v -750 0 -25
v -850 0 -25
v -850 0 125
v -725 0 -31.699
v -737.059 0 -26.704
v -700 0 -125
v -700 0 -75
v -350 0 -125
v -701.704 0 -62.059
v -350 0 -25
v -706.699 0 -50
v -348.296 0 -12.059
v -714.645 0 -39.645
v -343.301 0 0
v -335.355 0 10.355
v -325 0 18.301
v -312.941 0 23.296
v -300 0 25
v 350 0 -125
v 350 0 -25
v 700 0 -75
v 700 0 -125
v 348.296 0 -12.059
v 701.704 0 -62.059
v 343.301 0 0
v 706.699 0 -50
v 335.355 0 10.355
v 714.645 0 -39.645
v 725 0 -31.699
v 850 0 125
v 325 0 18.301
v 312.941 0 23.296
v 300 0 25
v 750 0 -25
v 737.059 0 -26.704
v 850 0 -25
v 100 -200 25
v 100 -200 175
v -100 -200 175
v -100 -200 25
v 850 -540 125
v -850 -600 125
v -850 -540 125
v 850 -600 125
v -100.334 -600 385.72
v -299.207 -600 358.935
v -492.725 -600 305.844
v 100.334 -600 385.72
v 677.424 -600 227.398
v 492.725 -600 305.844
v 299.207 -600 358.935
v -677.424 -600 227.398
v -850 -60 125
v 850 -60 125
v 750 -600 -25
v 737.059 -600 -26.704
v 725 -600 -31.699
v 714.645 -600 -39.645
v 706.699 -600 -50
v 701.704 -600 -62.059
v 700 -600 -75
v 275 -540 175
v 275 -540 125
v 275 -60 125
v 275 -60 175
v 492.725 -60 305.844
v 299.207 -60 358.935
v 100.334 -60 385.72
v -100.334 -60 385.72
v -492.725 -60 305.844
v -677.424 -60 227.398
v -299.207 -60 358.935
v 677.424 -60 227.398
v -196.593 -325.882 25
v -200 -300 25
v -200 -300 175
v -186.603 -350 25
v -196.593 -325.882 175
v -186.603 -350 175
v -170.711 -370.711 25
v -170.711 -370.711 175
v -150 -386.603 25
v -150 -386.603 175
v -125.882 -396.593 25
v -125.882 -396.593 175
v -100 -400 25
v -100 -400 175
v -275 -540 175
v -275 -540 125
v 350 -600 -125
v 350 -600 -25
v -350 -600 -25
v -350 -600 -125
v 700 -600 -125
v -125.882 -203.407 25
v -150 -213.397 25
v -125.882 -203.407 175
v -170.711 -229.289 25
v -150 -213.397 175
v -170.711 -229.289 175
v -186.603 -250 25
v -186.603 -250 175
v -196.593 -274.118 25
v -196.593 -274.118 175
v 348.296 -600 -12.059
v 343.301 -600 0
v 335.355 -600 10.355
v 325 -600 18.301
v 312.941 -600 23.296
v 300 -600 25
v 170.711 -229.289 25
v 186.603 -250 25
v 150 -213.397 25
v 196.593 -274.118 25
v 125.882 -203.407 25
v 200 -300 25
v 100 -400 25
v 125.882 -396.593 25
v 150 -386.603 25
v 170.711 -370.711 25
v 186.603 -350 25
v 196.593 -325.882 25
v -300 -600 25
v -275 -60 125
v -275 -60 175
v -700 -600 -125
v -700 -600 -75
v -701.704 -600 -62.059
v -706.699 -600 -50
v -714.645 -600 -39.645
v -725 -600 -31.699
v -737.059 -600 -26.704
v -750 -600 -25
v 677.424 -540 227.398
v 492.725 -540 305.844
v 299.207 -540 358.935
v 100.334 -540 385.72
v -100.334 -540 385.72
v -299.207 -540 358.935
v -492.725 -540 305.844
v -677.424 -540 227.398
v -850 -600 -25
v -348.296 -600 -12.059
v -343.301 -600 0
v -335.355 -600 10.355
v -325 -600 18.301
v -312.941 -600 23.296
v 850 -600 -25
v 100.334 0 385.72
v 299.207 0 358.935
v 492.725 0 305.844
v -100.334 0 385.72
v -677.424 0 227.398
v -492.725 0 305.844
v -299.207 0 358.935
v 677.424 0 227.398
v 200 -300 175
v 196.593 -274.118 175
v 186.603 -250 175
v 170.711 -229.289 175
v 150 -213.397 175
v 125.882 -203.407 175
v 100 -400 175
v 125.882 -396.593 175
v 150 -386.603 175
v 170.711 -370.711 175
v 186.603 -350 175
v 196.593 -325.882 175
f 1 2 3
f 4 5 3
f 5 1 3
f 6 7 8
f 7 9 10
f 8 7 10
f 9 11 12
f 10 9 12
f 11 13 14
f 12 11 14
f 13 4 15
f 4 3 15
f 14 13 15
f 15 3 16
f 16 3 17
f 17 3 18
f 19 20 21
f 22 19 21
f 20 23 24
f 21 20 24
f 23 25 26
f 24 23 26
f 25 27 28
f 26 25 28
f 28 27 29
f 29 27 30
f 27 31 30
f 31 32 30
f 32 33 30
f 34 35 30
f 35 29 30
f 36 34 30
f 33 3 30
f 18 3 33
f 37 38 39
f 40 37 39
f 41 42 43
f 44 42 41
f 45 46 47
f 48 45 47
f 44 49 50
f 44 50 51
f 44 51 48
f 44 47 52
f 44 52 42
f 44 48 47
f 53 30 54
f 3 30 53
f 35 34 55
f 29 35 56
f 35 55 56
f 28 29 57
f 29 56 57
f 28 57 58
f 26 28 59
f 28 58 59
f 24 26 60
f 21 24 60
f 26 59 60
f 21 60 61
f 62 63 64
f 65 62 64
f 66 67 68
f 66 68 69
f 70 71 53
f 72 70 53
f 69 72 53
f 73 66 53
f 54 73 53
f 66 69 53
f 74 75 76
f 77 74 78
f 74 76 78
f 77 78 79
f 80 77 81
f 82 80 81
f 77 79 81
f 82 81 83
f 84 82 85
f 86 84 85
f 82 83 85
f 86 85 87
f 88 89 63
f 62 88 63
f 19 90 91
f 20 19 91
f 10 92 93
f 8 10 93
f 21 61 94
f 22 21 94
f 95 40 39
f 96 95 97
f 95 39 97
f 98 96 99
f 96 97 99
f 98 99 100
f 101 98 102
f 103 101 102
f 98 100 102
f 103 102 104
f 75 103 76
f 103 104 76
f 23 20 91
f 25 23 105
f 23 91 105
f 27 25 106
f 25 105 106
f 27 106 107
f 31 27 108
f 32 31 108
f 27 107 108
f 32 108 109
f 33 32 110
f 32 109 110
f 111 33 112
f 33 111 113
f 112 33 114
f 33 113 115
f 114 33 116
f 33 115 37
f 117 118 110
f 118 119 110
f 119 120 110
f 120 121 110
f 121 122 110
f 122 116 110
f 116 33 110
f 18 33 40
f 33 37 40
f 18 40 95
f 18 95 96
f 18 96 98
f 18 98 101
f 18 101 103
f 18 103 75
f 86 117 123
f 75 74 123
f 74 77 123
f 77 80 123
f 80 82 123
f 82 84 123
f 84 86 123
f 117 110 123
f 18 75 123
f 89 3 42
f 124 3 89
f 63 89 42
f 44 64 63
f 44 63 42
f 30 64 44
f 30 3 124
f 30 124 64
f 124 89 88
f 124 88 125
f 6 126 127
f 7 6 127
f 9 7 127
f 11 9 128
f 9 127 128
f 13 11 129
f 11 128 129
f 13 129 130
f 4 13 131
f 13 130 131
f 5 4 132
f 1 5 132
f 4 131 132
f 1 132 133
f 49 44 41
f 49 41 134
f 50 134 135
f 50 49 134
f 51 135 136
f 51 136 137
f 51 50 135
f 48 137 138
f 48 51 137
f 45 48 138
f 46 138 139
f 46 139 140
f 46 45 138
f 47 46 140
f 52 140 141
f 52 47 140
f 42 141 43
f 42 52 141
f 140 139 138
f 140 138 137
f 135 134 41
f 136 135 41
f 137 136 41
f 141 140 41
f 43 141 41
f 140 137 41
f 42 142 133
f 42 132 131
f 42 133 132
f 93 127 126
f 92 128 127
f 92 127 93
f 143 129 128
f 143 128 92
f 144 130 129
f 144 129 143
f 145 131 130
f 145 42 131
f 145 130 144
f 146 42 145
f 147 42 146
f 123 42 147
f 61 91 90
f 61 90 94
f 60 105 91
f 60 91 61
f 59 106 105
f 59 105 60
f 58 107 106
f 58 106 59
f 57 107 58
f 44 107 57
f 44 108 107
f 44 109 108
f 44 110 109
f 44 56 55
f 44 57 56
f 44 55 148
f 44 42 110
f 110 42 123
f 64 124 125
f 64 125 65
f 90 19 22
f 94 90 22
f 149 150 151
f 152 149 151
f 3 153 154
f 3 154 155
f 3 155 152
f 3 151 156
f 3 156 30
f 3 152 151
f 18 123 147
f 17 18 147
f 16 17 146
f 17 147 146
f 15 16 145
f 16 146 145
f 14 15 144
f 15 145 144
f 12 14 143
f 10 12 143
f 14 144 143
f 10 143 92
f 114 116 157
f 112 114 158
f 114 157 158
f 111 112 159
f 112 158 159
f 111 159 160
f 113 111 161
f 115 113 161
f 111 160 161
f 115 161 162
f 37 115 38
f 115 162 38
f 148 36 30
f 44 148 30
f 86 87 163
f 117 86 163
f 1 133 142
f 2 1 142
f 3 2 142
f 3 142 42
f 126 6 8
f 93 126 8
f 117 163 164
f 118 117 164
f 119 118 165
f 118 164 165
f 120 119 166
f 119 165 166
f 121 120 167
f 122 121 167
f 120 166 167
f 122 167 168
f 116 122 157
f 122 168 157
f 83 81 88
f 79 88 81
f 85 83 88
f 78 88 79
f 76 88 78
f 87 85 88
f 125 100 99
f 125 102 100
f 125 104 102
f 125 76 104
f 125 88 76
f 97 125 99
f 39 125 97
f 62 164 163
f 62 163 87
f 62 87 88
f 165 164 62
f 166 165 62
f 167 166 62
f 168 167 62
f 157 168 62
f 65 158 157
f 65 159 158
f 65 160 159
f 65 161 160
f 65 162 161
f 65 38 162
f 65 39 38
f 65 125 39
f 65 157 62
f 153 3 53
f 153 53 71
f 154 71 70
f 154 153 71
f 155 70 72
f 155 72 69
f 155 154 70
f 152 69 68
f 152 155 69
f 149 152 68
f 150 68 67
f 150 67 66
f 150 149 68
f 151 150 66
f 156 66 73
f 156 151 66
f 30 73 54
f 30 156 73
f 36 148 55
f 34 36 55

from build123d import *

# Parameters (mm, degrees)
F0_W      = 1700
F0_H      = 250
F1_DEPTH  = 600
F3_DEPTH  = 600.001
F4_W      = 550
F4_H      = 480
F5_DEPTH  = 50
F7_DEPTH  = 300.001
F9_DEPTH  = 60
F11_DEPTH = 60
F13_DEPTH = 600.001


with BuildPart() as f1:
    # F0 (on Front) → F1 (new body)
    with BuildSketch(Plane.XZ):
        Rectangle(F0_W, F0_H)
    extrude(amount=F1_DEPTH)

    # F2 (on face) → F3 (cut, through all)
    with BuildSketch(Plane.XZ.offset(600)):
        with BuildLine():
            Line((-850, -25), (-850, -125))
            Line((-850, -125), (-700, -125))
            Line((-700, -125), (-700, -75))
            ThreePointArc((-700, -75), (-714.644661, -39.644661), (-750, -25))
            Line((-750, -25), (-850, -25))
        make_face()
        with BuildLine():
            Line((700, -125), (850, -125))
            Line((850, -125), (850, -25))
            Line((850, -25), (750, -25))
            ThreePointArc((750, -25), (714.644661, -39.644661), (700, -75))
            Line((700, -75), (700, -125))
        make_face()
    extrude(amount=-F3_DEPTH, mode=Mode.SUBTRACT)

    # F4 (on face) → F5 (join)
    with BuildSketch(Plane.XY.offset(125)):
        with Locations((0, -300)):
            Rectangle(F4_W, F4_H)
    extrude(amount=F5_DEPTH)

    # F6 (on face) → F7 (cut, through all)
    with BuildSketch(Plane.XY.offset(175)):
        with BuildLine():
            ThreePointArc((200, -300), (170.710678, -229.289322), (100, -200))
            Line((100, -200), (-100, -200))
            ThreePointArc((-100, -200), (-170.710678, -229.289322), (-200, -300))
            ThreePointArc((-200, -300), (-170.710678, -370.710678), (-100, -400))
            Line((-100, -400), (100, -400))
            ThreePointArc((100, -400), (170.710678, -370.710678), (200, -300))
        make_face()
    extrude(amount=-F7_DEPTH, mode=Mode.SUBTRACT)

    # F12 (on face) → F13 (cut, through all)
    with BuildSketch(Plane.XZ.offset(600)):
        with BuildLine():
            ThreePointArc((350, -25), (335.355339, 10.355339), (300, 25))
            Line((300, 25), (-300, 25))
            ThreePointArc((-300, 25), (-335.355339, 10.355339), (-350, -25))
            Line((-350, -25), (-350, -275))
            Line((-350, -275), (350, -275))
            Line((350, -275), (350, -25))
        make_face()
    extrude(amount=-F13_DEPTH, mode=Mode.SUBTRACT)


with BuildPart() as f9:
    # F8 (on face) → F9 (new body)
    with BuildSketch(Plane.XZ.offset(600)):
        with BuildLine():
            Line((-850, 125), (850, 125))
            ThreePointArc((850, 125), (0, 389.079291), (-850, 125))
        make_face()
    extrude(amount=-F9_DEPTH)


with BuildPart() as f11:
    # F10 (on face) → F11 (new body)
    with BuildSketch(Plane(origin=(0, 0, 0), x_dir=(-1, 0, 0), z_dir=(0, 1, 0))):
        with BuildLine():
            Line((-850, 125), (850, 125))
            ThreePointArc((850, 125), (0, 389.079291), (-850, 125))
        make_face()
    extrude(amount=-F11_DEPTH)


solid = Compound([f1.part, f9.part, f11.part])
